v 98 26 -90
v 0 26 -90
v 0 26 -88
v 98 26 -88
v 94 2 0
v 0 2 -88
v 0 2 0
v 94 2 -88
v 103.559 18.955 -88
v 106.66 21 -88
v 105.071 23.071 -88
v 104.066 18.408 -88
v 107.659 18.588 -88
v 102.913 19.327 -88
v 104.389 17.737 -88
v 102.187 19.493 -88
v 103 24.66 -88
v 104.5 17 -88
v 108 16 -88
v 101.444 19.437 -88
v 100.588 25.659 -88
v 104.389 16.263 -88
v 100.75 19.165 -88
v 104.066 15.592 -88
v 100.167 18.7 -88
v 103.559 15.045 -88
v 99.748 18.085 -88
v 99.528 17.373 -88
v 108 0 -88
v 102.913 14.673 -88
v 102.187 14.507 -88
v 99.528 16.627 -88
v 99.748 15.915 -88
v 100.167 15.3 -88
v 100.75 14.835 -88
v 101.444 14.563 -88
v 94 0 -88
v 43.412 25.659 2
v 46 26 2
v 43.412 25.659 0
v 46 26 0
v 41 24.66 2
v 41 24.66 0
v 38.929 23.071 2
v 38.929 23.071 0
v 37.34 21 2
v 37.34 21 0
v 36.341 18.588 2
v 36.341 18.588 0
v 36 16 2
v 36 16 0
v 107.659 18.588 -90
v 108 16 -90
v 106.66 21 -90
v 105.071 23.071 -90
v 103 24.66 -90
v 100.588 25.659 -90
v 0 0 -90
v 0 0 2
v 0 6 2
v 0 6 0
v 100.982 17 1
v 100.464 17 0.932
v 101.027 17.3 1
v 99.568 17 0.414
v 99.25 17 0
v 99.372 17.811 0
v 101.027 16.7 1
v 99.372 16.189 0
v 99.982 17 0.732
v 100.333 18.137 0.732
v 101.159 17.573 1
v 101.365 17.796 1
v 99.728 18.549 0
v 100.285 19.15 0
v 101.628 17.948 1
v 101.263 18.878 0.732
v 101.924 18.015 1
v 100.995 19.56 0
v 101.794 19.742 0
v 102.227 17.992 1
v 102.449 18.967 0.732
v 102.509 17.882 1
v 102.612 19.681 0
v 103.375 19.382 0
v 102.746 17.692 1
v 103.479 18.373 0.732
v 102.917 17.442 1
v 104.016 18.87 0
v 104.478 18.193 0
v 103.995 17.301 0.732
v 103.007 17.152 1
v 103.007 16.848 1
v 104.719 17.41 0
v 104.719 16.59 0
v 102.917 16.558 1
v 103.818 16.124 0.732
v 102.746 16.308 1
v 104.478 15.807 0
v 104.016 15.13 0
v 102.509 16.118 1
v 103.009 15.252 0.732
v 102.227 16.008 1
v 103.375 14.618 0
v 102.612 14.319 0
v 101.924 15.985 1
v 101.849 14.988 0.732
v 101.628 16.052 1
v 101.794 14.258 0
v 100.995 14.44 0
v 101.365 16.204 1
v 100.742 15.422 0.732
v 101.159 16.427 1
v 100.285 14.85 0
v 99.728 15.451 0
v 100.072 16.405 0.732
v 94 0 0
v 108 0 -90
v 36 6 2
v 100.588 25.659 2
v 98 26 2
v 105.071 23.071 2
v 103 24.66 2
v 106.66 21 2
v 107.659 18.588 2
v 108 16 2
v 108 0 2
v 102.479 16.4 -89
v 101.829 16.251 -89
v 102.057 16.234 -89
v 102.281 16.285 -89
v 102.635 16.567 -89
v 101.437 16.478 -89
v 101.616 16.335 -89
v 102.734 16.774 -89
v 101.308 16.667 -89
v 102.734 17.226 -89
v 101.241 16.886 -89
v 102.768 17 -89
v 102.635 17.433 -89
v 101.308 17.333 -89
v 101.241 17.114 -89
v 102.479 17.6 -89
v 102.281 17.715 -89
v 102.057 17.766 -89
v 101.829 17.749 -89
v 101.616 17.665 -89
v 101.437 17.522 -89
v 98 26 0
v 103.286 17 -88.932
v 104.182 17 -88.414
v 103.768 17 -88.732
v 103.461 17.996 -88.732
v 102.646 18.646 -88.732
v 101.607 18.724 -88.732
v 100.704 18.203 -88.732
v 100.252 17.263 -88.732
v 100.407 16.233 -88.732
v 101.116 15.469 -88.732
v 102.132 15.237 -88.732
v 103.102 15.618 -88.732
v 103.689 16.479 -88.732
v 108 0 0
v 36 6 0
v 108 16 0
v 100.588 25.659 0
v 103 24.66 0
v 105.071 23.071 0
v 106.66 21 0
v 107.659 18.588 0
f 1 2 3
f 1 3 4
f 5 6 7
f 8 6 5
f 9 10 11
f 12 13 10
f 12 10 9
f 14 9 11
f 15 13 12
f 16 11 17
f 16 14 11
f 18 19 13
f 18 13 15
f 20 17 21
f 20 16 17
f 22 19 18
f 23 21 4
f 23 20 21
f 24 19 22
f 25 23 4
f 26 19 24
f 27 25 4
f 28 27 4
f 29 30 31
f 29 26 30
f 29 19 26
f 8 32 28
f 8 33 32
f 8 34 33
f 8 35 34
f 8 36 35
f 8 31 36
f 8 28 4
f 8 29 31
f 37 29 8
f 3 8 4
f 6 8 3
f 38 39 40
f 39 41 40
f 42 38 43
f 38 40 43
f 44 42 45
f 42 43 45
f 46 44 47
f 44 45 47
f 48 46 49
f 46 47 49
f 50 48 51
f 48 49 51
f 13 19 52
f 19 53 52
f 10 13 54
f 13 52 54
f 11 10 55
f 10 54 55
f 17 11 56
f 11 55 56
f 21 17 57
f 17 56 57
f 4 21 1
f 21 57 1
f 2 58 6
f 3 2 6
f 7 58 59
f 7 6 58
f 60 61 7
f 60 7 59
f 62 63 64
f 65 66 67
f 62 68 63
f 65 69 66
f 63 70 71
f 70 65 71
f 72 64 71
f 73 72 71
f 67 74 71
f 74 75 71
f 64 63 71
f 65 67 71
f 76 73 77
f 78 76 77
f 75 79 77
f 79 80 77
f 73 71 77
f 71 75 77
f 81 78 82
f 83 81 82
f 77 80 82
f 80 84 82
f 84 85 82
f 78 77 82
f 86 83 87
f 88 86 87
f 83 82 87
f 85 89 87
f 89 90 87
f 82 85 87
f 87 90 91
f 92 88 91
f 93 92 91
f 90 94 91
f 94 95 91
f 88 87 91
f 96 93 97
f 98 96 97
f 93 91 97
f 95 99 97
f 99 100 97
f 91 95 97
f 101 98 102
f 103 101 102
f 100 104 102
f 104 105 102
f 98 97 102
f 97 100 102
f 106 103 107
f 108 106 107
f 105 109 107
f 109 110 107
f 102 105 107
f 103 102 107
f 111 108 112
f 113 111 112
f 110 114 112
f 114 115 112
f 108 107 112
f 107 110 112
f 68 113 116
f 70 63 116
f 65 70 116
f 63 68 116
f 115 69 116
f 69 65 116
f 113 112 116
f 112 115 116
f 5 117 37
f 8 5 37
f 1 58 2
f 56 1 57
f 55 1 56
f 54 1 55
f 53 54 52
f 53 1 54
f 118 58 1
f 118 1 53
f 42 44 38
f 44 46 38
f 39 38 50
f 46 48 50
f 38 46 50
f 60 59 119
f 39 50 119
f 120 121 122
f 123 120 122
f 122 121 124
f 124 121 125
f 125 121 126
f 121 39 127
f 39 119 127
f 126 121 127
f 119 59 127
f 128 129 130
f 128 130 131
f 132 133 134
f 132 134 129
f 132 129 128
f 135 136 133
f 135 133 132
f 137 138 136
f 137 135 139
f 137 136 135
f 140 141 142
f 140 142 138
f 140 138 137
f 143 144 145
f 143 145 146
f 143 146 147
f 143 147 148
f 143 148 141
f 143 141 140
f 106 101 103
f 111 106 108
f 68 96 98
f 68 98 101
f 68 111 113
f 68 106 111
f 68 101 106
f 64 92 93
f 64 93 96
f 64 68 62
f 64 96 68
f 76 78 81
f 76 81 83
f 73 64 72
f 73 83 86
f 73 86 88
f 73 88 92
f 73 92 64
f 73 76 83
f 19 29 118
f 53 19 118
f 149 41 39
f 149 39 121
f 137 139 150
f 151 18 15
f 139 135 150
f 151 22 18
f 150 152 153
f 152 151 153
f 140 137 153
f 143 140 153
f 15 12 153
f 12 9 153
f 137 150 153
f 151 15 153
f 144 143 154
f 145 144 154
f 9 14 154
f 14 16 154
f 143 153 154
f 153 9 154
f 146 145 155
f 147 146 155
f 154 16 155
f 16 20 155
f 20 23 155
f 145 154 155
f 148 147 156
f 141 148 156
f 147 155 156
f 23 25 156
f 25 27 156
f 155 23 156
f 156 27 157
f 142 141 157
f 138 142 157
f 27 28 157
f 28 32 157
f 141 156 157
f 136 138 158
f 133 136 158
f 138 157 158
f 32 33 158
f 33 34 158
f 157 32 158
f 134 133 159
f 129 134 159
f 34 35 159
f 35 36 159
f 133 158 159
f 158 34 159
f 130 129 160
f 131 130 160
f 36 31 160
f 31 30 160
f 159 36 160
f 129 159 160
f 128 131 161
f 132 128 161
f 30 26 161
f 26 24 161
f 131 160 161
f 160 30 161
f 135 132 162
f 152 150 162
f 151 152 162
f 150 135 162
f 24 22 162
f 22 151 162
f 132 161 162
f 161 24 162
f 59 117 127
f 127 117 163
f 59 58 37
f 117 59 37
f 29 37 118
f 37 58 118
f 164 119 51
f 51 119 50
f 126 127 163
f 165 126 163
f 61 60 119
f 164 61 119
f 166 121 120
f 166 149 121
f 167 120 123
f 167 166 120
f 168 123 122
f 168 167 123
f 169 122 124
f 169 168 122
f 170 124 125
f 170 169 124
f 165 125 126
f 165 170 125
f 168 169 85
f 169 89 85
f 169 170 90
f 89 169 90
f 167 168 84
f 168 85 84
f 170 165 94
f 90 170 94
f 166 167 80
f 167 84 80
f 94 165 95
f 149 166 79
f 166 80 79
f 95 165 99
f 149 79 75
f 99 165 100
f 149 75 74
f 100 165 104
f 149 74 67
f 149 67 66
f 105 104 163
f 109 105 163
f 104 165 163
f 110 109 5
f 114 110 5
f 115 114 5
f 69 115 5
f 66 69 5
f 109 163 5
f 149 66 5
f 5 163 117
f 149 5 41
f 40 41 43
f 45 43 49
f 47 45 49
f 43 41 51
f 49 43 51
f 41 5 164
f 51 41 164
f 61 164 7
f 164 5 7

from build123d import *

# Parameters (mm, degrees)
SKETCH1_W           = 108
SKETCH1_H           = 88
BOSS_EXTRUDE2_DEPTH = 2
SKETCH1_3_W         = 112
SKETCH1_3_H         = 92
SKETCH1_3_W_2       = 108
SKETCH1_3_H_2       = 88
BOSS_EXTRUDE3_DEPTH = 26
SKETCH5_W           = 92
SKETCH5_H           = 26
CUT_EXTRUDE1_DEPTH  = 2
SKETCH6_R           = 2.75
CUT_EXTRUDE2_DEPTH  = 1
SKETCH7_R           = 2.5
CUT_EXTRUDE3_DEPTH  = 1
FILLET1_R           = 2
FILLET2_R           = 2
SKETCH9_W           = 38
SKETCH9_H           = 20
CUT_EXTRUDE4_DEPTH  = 2
SKETCH10_W          = 92
SKETCH10_H          = 26
CUT_EXTRUDE5_DEPTH  = 2
FILLET3_R           = 10
FILLET4_R           = 10
FILLET5_R           = 10
SKETCH11_W          = 14
SKETCH11_H          = 88
CUT_EXTRUDE6_DEPTH  = 2


with BuildPart() as part:
    # Sketch1 → Boss-Extrude2 (new body)
    with BuildSketch(Plane(origin=(0, 0, 0), x_dir=(1, 0, 0), z_dir=(0, 1, 0))):
        with Locations((54, 44)):
            Rectangle(SKETCH1_W, SKETCH1_H)
    extrude(amount=BOSS_EXTRUDE2_DEPTH)

    # Sketch1<3> → Boss-Extrude3 (add)
    with BuildSketch(Plane(origin=(0, 0, 0), x_dir=(1, 0, 0), z_dir=(0, 1, 0))):
        with Locations((54, 44)):
            Rectangle(SKETCH1_3_W, SKETCH1_3_H)
        with Locations((54, 44)):
            Rectangle(SKETCH1_3_W_2, SKETCH1_3_H_2, mode=Mode.SUBTRACT)
    extrude(amount=BOSS_EXTRUDE3_DEPTH)

    # Sketch5 → Cut-Extrude1 (cut)
    with BuildSketch(Plane(origin=(110, 0, 0), x_dir=(0, 0, -1), z_dir=(1, 0, 0))):
        with Locations((44, 13)):
            Rectangle(SKETCH5_W, SKETCH5_H)
    extrude(amount=-CUT_EXTRUDE1_DEPTH, mode=Mode.SUBTRACT)

    # Sketch6 → Cut-Extrude2 (cut)
    with BuildSketch(Plane(origin=(0, 0, 0), x_dir=(-1, 0, 0), z_dir=(0, 0, -1))):
        with Locations((-102, 17)):
            Circle(SKETCH6_R)
    extrude(amount=-CUT_EXTRUDE2_DEPTH, mode=Mode.SUBTRACT)

    # Sketch7 → Cut-Extrude3 (cut)
    with BuildSketch(Plane.XY.offset(-88)):
        with Locations((102, 17)):
            Circle(SKETCH7_R)
    extrude(amount=-CUT_EXTRUDE3_DEPTH, mode=Mode.SUBTRACT)

    # Fillet1
    # the kernel refuses this fillet: 2 mm, written as the material it adds along each edge
    with BuildSketch(Plane(origin=(102, 17, 1), x_dir=(-1, 0, 0), z_dir=(0, -1, 0))) as fillet1_piece_1:
        with BuildLine():
            CenterArc((1.017949192, 2), FILLET1_R, 270, 60)
            Line((1.017949192, 0), (1.017949192, -0.04))
            Line((1.017949192, -0.04), (2.75, -0.04))
            Line((2.75, -0.04), (2.79, 0))
            ThreePointArc((2.79, 0), (2.79, 0.5), (2.784641016, 0.98))
            Line((2.784641016, 0.98), (2.75, 1))
        make_face()
    revolve(axis=Axis((102, 17, 1), (0, 0, -1)))

    # Fillet2
    # the kernel refuses this fillet: 2 mm, written as the material it adds along each edge
    with BuildSketch(Plane(origin=(102, 17, -89), x_dir=(1, 0, 0), z_dir=(0, -1, 0))) as fillet2_piece_1:
        with BuildLine():
            CenterArc((0.767949192, 2), FILLET2_R, 270, 60)
            Line((0.767949192, 0), (0.767949192, -0.04))
            Line((0.767949192, -0.04), (2.5, -0.04))
            Line((2.5, -0.04), (2.54, 0))
            ThreePointArc((2.54, 0), (2.54, 0.5), (2.534641016, 0.98))
            Line((2.534641016, 0.98), (2.5, 1))
        make_face()
    revolve(axis=Axis((102, 17, -89), (0, 0, 1)))

    # Sketch9 → Cut-Extrude4 (cut)
    with BuildSketch(Plane.XY.offset(2)):
        with Locations((17, 16)):
            Rectangle(SKETCH9_W, SKETCH9_H)
    extrude(amount=-CUT_EXTRUDE4_DEPTH, mode=Mode.SUBTRACT)

    # Sketch10 → Cut-Extrude5 (cut)
    with BuildSketch(Plane.ZY.offset(2)):
        with Locations((-44, 13)):
            Rectangle(SKETCH10_W, SKETCH10_H)
    extrude(amount=-CUT_EXTRUDE5_DEPTH, mode=Mode.SUBTRACT)

    # Fillet3
    fillet3_edges = [part.edges().sort_by_distance(p)[0] for p in [
        (36, 26, 1),
    ]]
    fillet(fillet3_edges, radius=FILLET3_R)

    # Fillet4
    fillet4_edges = [part.edges().sort_by_distance(p)[0] for p in [
        (108, 26, 1),
    ]]
    fillet(fillet4_edges, radius=FILLET4_R)

    # Fillet5
    fillet5_edges = [part.edges().sort_by_distance(p)[0] for p in [
        (108, 26, -89),
    ]]
    fillet(fillet5_edges, radius=FILLET5_R)

    # Sketch11 → Cut-Extrude6 (cut)
    with BuildSketch(Plane(origin=(0, 0, 0), x_dir=(-1, 0, 0), z_dir=(0, -1, 0))):
        with Locations((-101, 44)):
            Rectangle(SKETCH11_W, SKETCH11_H)
    extrude(amount=-CUT_EXTRUDE6_DEPTH, mode=Mode.SUBTRACT)


solid = part.part
